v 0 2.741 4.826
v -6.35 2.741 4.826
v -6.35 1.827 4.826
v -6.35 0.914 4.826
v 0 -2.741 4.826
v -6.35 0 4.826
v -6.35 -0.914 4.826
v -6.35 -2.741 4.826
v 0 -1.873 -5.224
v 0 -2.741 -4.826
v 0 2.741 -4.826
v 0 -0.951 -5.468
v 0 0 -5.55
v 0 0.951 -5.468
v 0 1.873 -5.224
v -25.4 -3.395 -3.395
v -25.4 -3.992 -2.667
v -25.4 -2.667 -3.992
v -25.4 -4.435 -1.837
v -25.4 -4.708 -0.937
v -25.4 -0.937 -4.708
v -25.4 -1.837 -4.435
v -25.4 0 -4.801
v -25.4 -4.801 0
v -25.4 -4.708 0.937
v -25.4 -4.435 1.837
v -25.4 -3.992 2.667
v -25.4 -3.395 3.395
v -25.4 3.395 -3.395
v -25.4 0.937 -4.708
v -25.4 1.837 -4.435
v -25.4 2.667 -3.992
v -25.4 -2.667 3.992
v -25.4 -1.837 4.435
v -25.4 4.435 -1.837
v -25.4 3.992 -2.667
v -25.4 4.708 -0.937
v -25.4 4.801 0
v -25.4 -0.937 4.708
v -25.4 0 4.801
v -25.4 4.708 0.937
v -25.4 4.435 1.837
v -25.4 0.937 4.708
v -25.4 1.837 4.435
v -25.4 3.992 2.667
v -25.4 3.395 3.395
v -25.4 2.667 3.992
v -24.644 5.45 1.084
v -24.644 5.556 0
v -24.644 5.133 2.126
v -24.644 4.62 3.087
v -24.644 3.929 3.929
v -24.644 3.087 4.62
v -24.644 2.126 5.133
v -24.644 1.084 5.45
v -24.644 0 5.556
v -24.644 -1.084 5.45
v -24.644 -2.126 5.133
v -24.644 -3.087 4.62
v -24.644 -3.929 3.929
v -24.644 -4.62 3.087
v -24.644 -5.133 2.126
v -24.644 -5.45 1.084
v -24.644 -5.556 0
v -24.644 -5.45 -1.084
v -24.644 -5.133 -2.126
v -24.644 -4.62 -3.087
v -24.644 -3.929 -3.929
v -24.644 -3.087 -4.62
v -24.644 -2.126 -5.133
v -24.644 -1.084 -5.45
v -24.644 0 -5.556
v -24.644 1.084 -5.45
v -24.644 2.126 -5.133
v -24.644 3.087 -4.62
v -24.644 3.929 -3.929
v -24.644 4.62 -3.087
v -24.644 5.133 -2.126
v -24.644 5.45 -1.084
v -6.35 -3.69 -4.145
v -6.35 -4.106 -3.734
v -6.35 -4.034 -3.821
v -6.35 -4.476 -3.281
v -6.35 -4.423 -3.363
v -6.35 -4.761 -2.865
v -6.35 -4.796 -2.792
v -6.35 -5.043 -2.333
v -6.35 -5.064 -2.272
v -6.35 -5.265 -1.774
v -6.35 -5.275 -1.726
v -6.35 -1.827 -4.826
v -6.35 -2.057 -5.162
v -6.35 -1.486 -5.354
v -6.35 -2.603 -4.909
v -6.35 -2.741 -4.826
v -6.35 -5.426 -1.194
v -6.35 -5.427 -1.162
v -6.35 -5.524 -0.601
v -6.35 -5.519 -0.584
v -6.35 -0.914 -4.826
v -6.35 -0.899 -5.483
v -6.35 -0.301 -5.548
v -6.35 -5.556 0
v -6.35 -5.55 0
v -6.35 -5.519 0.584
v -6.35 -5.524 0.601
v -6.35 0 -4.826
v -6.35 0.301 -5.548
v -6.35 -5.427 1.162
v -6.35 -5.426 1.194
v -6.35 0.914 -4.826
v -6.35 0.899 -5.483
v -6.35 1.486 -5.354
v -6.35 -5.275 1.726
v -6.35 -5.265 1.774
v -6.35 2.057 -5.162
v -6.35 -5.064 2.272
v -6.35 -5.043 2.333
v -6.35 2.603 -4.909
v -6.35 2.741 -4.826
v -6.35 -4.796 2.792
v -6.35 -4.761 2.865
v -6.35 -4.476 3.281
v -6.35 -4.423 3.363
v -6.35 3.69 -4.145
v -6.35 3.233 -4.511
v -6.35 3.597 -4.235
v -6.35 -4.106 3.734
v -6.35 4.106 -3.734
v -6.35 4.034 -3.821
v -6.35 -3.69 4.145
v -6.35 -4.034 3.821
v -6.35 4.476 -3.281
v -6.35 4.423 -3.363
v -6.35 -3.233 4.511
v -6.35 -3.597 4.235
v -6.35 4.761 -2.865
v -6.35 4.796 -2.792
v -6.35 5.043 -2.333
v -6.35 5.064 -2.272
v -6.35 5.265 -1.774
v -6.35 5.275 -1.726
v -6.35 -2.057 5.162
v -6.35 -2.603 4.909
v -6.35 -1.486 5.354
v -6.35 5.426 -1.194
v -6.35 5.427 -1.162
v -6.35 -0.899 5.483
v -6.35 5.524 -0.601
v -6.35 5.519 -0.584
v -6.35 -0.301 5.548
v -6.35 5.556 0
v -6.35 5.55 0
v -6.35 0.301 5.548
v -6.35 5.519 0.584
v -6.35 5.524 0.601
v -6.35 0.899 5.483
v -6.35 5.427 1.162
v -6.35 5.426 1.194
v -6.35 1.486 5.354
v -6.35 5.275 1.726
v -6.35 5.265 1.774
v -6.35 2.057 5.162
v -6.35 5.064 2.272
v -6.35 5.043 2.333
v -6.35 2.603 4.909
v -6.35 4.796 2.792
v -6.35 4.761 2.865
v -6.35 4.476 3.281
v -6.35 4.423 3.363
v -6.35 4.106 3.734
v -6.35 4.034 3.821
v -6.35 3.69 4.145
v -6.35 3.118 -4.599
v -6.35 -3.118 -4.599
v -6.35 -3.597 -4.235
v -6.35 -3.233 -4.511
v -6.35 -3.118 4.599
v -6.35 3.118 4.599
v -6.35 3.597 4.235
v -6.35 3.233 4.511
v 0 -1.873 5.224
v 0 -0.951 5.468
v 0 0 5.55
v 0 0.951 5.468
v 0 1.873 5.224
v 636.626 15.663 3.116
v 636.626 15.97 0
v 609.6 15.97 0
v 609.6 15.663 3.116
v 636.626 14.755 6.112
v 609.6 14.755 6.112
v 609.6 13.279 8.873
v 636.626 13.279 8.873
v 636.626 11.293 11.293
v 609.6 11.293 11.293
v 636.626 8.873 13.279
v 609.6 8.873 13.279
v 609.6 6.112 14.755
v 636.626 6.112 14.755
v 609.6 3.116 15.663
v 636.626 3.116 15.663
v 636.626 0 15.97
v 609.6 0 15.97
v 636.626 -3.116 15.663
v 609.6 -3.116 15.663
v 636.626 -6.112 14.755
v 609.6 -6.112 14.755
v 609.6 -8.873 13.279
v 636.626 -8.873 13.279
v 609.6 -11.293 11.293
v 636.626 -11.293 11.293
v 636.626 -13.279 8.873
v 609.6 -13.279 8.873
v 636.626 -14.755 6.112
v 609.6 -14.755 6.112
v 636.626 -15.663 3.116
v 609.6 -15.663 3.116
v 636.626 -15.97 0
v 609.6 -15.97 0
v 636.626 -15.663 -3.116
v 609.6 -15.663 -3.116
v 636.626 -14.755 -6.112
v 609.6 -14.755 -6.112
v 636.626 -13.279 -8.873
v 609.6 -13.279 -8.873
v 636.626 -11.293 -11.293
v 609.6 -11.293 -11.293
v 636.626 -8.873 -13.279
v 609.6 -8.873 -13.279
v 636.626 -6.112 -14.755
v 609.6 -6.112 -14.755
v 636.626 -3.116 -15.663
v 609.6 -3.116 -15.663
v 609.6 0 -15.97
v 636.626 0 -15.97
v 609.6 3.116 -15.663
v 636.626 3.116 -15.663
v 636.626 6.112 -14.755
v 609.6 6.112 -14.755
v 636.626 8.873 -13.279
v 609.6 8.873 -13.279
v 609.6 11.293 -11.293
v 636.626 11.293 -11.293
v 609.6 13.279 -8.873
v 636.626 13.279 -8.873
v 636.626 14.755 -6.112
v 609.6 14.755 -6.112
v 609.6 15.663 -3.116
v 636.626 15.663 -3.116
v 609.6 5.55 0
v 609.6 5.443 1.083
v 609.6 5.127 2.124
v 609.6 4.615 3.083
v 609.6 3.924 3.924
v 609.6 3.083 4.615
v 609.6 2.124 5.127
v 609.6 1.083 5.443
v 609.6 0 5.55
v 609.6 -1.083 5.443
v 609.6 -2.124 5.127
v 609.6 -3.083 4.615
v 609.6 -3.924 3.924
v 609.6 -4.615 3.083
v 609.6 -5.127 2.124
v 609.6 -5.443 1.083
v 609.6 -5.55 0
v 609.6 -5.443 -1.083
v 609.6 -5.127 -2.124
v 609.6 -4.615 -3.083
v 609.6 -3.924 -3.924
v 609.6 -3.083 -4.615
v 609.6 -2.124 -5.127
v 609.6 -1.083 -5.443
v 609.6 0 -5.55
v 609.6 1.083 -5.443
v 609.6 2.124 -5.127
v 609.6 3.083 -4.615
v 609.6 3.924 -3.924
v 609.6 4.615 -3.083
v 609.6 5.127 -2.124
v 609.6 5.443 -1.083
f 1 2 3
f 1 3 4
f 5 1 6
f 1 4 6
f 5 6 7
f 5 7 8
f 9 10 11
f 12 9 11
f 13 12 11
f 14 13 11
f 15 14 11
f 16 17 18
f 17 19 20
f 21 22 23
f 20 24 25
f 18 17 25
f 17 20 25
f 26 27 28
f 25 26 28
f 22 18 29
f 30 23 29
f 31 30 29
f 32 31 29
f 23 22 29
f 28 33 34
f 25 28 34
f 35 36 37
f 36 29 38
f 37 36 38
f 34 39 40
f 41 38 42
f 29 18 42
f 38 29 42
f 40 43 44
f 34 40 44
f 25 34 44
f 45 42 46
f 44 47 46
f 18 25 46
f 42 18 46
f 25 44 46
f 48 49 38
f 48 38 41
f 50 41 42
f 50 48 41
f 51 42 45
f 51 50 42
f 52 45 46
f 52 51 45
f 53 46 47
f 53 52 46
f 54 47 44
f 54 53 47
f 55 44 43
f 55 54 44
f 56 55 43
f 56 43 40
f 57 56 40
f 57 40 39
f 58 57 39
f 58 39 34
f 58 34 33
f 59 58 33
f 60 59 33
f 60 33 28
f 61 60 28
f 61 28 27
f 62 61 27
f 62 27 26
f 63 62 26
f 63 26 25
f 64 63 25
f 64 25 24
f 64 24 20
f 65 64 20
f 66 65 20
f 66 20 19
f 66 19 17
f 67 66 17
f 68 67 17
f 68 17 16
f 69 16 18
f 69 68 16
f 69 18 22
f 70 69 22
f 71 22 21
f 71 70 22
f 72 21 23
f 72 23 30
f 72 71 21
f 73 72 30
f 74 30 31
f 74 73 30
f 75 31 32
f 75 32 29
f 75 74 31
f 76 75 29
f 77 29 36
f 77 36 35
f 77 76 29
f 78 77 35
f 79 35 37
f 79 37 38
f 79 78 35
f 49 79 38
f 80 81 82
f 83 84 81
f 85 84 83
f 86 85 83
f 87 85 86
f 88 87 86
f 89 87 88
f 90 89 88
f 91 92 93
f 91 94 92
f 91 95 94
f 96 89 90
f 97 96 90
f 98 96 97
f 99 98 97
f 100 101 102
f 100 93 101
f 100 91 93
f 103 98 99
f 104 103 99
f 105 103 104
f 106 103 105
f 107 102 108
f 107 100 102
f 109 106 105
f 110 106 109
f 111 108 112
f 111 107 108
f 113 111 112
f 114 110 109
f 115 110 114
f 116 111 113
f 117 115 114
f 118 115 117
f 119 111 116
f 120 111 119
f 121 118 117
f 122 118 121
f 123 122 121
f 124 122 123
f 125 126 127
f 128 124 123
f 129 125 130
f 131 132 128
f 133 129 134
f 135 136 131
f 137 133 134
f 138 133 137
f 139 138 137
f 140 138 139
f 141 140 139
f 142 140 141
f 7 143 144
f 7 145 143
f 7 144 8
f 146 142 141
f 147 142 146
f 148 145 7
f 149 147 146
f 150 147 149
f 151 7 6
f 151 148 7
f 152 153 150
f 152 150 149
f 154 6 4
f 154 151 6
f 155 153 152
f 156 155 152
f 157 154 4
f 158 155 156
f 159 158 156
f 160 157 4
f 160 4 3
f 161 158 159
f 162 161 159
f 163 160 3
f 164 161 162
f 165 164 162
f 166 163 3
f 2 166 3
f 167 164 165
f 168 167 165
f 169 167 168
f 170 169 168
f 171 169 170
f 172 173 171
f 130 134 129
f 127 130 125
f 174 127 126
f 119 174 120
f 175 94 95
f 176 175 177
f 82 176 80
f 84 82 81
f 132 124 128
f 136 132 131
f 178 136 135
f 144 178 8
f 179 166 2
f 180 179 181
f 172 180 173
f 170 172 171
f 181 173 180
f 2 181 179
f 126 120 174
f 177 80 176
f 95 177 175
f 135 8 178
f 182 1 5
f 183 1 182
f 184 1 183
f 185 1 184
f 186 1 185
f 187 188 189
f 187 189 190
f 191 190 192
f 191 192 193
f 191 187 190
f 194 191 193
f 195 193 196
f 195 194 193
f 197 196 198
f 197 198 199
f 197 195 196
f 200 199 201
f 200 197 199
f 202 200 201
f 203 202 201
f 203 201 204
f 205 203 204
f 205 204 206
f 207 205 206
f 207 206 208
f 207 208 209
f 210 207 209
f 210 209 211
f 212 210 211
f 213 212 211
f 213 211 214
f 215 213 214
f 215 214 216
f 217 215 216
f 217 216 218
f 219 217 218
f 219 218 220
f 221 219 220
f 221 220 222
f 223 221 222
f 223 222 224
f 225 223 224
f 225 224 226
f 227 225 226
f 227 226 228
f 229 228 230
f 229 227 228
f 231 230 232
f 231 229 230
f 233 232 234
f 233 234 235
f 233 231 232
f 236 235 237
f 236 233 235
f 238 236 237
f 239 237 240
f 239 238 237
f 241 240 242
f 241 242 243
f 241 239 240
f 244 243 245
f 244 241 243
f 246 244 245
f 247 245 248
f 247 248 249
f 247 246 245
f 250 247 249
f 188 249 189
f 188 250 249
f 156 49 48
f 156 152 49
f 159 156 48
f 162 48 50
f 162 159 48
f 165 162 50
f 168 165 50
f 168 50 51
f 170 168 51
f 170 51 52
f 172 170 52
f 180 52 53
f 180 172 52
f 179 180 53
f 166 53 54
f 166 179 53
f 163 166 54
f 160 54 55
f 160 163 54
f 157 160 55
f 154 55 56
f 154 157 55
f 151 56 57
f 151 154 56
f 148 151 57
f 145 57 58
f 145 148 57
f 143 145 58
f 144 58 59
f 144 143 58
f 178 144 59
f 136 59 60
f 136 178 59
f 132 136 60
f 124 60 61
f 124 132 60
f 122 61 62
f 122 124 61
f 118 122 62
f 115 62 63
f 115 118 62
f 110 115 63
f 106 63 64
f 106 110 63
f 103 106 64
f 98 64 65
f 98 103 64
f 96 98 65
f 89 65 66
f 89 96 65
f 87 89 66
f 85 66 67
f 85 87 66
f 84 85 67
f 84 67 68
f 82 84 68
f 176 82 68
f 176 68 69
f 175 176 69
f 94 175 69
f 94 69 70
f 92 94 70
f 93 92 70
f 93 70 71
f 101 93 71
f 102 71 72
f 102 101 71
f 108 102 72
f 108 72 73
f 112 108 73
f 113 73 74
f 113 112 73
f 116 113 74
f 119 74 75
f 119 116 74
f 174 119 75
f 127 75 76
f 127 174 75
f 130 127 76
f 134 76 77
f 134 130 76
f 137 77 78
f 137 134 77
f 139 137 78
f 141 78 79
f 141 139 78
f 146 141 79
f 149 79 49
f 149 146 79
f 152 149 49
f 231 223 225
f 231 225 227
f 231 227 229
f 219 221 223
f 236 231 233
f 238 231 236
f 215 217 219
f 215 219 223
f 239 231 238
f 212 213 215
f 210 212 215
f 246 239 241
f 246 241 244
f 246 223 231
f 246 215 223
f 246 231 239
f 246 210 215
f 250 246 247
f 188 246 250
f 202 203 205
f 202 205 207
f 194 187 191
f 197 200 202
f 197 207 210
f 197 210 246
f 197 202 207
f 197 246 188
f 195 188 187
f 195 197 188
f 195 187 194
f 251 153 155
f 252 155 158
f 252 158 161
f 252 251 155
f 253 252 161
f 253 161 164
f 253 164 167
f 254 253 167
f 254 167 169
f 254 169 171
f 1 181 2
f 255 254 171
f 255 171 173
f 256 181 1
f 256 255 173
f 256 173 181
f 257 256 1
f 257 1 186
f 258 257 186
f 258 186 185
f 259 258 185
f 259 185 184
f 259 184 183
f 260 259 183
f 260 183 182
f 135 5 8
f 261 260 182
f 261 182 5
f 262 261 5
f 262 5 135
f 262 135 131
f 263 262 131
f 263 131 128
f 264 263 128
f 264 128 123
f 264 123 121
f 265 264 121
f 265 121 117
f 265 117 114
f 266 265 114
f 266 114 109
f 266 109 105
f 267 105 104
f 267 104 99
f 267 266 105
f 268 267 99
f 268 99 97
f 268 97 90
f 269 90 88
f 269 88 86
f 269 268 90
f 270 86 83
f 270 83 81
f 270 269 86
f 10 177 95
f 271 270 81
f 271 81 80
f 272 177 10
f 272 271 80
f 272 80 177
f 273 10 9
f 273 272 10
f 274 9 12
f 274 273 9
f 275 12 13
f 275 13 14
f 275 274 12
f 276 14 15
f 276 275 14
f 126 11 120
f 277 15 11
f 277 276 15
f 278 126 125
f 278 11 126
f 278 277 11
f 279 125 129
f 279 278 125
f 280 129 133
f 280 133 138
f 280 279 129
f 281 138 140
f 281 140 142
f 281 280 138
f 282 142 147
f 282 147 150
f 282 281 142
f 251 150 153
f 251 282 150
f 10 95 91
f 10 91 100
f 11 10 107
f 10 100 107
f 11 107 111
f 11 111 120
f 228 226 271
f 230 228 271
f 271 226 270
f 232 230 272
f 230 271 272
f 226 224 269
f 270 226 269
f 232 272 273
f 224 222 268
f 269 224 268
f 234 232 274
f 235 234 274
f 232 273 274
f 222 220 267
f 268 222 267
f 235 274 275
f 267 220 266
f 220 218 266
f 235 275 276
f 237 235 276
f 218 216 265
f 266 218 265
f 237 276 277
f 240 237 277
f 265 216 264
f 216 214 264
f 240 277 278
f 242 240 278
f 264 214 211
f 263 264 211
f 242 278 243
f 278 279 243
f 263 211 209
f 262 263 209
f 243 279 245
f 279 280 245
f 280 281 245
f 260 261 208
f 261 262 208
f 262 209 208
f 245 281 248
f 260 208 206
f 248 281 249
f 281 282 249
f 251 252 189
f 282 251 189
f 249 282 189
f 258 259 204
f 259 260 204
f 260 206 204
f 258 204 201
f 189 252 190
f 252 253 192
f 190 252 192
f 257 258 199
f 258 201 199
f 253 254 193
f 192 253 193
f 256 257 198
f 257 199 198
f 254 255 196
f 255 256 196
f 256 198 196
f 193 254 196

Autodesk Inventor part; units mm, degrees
sketch "Sketch_1" plane through (0, 0, 0) normal (0, 0, 1) x (1, 0, 0)
  line L0 (636.6256, 0) -> (-6.35, 0)
  line L1 (-6.35, 0) -> (-6.35, 5.5499)
  line L2 (-6.35, 5.5499) -> (609.6, 5.5499)
  line L3 (609.6, 5.5499) -> (609.6, 15.9703)
  line L4 (609.6, 15.9703) -> (636.6256, 15.9703)
  line L5 (636.6256, 15.9703) -> (636.6256, 0)
  line L6 (636.6256, 0) -> (-6.35, 0)
revolve "Revolution1" add sketch "Sketch_1" angle 360 about axis through (636.6256, 0, 0) along (1, 0, 0)
sketch "Sketch_3" plane through (0, 0, 0) normal (0, 0, 1) x (1, 0, 0)
  line L0 (-6.35, 0) -> (-25.4, 0)
  line L1 (-25.4, 0) -> (-25.4, 4.8006)
  line L2 (-25.4, 4.8006) -> (-24.6443, 5.5563)
  line L3 (-24.6443, 5.5563) -> (-6.35, 5.5563)
  line L4 (-6.35, 5.5563) -> (-6.35, 0)
  line L5 (-6.35, 0) -> (-25.4, 0)
revolve "Revolution2" add sketch "Sketch_3" angle 360 about axis through (-6.35, 0, 0) along (1, 0, 0)
thread "Thread1" size "7/16-20 UNF" class "2A" standard "ANSI Unified Screw Threads" full length
sketch "Sketch_10" plane through (-6.35, 0, 0) normal (1, 0, 0) x (0, 0, -1)
  line L0 (-11.0998, -11.0998) -> (11.0998, -11.0998)
  line L1 (11.0998, -11.0998) -> (11.0998, 11.0998)
  line L2 (11.0998, 11.0998) -> (-11.0998, 11.0998)
  line L3 (-11.0998, 11.0998) -> (-11.0998, -11.0998)
  line L4 (-4.826, -5.5499) -> (4.826, -5.5499)
  line L5 (4.826, -5.5499) -> (4.826, 5.5499)
  line L6 (4.826, 5.5499) -> (-4.826, 5.5499)
  line L7 (-4.826, 5.5499) -> (-4.826, -5.5499)
extrude "Extrusion1" cut sketch "Sketch_10" along normal blind 6.35
ref_plane "dia1_XY" through (-6.35, 5.5499, 0) normal (1, 0, 0) x (0, 0, -1)
ref_plane "dia1_YZ" through (-6.35, 5.5499, 0) normal (0, 0, -1) x (0, 1, 0)
ref_plane "dia1_ZX" through (-6.35, 5.5499, 0) normal (0, 1, 0) x (1, 0, 0)
ref_plane "dia12_XY" through (0, 0, 16.8466) normal (1, 0, 0) x (0, 0, -1)
ref_plane "dia12_YZ" through (0, 0, 16.8466) normal (0, 0, -1) x (0, 1, 0)
ref_plane "dia12_ZX" through (0, 0, 16.8466) normal (0, 1, 0) x (1, 0, 0)
ref_plane "dia2_XY" through (-6.35, -5.5499, 0) normal (1, 0, 0) x (0, 0, -1)
ref_plane "dia2_YZ" through (-6.35, -5.5499, 0) normal (0, 0, -1) x (0, 1, 0)
ref_plane "dia2_ZX" through (-6.35, -5.5499, 0) normal (0, 1, 0) x (1, 0, 0)
ref_plane "dia22_XY" through (0, 0, -16.8466) normal (1, 0, 0) x (0, 0, -1)
ref_plane "dia22_YZ" through (0, 0, -16.8466) normal (0, 0, -1) x (0, 1, 0)
ref_plane "dia22_ZX" through (0, 0, -16.8466) normal (0, 1, 0) x (1, 0, 0)
ref_plane "hh1_XY" through (669.1313, 0, 0) normal (0, 0, 1) x (1, 0, 0)
ref_plane "hh1_YZ" through (669.1313, 0, 0) normal (1, 0, 0) x (0, 1, 0)
ref_plane "hh1_ZX" through (669.1313, 0, 0) normal (0, 1, 0) x (0, 0, 1)
ref_plane "hh2_XY" through (675.5448, 0, 0) normal (0, 0, 1) x (1, 0, 0)
ref_plane "hh2_YZ" through (675.5448, 0, 0) normal (1, 0, 0) x (0, 1, 0)
ref_plane "hh2_ZX" through (675.5448, 0, 0) normal (0, 1, 0) x (0, 0, 1)
ref_plane "rl1_XY" through (-25.4, 0, 0) normal (1, 0, 0) x (0, 0, -1)
ref_plane "rl1_YZ" through (-25.4, 0, 0) normal (0, 0, -1) x (0, 1, 0)
ref_plane "rl1_ZX" through (-25.4, 0, 0) normal (0, 1, 0) x (1, 0, 0)
ref_plane "rl2_XY" through (-6.35, 0, 0) normal (1, 0, 0) x (0, 0, -1)
ref_plane "rl2_YZ" through (-6.35, 0, 0) normal (0, 0, -1) x (0, 1, 0)
ref_plane "rl2_ZX" through (-6.35, 0, 0) normal (0, 1, 0) x (1, 0, 0)
ref_plane "rod_cp_XY" through (0, 0, 0) normal (1, 0, 0) x (0, 0, -1)
ref_plane "rod_cp_YZ" through (0, 0, 0) normal (0, 0, -1) x (0, 1, 0)
ref_plane "rod_cp_ZX" through (0, 0, 0) normal (0, 1, 0) x (1, 0, 0)
ref_plane "thd1_XY" through (-25.4, 5.5563, 0) normal (1, 0, 0) x (0, 0, -1)
ref_plane "thd1_YZ" through (-25.4, 5.5563, 0) normal (0, 0, -1) x (0, 1, 0)
ref_plane "thd1_ZX" through (-25.4, 5.5563, 0) normal (0, 1, 0) x (1, 0, 0)
ref_plane "thd2_XY" through (-25.4, -5.5563, 0) normal (1, 0, 0) x (0, 0, -1)
ref_plane "thd2_YZ" through (-25.4, -5.5563, 0) normal (0, 0, -1) x (0, 1, 0)
ref_plane "thd2_ZX" through (-25.4, -5.5563, 0) normal (0, 1, 0) x (1, 0, 0)
ref_plane "to_rod_clevis_XY" through (-31.75, 0, 0) normal (1, 0, 0) x (0, 0, -1)
ref_plane "to_rod_clevis_YZ" through (-31.75, 0, 0) normal (0, 0, -1) x (0, 1, 0)
ref_plane "to_rod_clevis_ZX" through (-31.75, 0, 0) normal (0, 1, 0) x (1, 0, 0)
ref_plane "wf1_XY" through (-6.35, 0, 0) normal (1, 0, 0) x (0, 0, -1)
ref_plane "wf1_YZ" through (-6.35, 0, 0) normal (0, 0, -1) x (0, 1, 0)
ref_plane "wf1_ZX" through (-6.35, 0, 0) normal (0, 1, 0) x (1, 0, 0)
ref_plane "wf2_XY" through (0, 0, 0) normal (1, 0, 0) x (0, 0, -1)
ref_plane "wf2_YZ" through (0, 0, 0) normal (0, 0, -1) x (0, 1, 0)
ref_plane "wf2_ZX" through (0, 0, 0) normal (0, 1, 0) x (1, 0, 0)
ref_plane "wfw1_XY" through (-6.35, 0, -4.826) normal (0, 1, 0) x (1, 0, 0)
ref_plane "wfw1_YZ" through (-6.35, 0, -4.826) normal (1, 0, 0) x (0, 0, -1)
ref_plane "wfw1_ZX" through (-6.35, 0, -4.826) normal (0, 0, -1) x (0, 1, 0)
ref_plane "wfw2_XY" through (-6.35, 0, 4.826) normal (0, 1, 0) x (1, 0, 0)
ref_plane "wfw2_YZ" through (-6.35, 0, 4.826) normal (1, 0, 0) x (0, 0, -1)
ref_plane "wfw2_ZX" through (-6.35, 0, 4.826) normal (0, 0, -1) x (0, 1, 0)
properties part number "SR-1222-DP0000_rod"
